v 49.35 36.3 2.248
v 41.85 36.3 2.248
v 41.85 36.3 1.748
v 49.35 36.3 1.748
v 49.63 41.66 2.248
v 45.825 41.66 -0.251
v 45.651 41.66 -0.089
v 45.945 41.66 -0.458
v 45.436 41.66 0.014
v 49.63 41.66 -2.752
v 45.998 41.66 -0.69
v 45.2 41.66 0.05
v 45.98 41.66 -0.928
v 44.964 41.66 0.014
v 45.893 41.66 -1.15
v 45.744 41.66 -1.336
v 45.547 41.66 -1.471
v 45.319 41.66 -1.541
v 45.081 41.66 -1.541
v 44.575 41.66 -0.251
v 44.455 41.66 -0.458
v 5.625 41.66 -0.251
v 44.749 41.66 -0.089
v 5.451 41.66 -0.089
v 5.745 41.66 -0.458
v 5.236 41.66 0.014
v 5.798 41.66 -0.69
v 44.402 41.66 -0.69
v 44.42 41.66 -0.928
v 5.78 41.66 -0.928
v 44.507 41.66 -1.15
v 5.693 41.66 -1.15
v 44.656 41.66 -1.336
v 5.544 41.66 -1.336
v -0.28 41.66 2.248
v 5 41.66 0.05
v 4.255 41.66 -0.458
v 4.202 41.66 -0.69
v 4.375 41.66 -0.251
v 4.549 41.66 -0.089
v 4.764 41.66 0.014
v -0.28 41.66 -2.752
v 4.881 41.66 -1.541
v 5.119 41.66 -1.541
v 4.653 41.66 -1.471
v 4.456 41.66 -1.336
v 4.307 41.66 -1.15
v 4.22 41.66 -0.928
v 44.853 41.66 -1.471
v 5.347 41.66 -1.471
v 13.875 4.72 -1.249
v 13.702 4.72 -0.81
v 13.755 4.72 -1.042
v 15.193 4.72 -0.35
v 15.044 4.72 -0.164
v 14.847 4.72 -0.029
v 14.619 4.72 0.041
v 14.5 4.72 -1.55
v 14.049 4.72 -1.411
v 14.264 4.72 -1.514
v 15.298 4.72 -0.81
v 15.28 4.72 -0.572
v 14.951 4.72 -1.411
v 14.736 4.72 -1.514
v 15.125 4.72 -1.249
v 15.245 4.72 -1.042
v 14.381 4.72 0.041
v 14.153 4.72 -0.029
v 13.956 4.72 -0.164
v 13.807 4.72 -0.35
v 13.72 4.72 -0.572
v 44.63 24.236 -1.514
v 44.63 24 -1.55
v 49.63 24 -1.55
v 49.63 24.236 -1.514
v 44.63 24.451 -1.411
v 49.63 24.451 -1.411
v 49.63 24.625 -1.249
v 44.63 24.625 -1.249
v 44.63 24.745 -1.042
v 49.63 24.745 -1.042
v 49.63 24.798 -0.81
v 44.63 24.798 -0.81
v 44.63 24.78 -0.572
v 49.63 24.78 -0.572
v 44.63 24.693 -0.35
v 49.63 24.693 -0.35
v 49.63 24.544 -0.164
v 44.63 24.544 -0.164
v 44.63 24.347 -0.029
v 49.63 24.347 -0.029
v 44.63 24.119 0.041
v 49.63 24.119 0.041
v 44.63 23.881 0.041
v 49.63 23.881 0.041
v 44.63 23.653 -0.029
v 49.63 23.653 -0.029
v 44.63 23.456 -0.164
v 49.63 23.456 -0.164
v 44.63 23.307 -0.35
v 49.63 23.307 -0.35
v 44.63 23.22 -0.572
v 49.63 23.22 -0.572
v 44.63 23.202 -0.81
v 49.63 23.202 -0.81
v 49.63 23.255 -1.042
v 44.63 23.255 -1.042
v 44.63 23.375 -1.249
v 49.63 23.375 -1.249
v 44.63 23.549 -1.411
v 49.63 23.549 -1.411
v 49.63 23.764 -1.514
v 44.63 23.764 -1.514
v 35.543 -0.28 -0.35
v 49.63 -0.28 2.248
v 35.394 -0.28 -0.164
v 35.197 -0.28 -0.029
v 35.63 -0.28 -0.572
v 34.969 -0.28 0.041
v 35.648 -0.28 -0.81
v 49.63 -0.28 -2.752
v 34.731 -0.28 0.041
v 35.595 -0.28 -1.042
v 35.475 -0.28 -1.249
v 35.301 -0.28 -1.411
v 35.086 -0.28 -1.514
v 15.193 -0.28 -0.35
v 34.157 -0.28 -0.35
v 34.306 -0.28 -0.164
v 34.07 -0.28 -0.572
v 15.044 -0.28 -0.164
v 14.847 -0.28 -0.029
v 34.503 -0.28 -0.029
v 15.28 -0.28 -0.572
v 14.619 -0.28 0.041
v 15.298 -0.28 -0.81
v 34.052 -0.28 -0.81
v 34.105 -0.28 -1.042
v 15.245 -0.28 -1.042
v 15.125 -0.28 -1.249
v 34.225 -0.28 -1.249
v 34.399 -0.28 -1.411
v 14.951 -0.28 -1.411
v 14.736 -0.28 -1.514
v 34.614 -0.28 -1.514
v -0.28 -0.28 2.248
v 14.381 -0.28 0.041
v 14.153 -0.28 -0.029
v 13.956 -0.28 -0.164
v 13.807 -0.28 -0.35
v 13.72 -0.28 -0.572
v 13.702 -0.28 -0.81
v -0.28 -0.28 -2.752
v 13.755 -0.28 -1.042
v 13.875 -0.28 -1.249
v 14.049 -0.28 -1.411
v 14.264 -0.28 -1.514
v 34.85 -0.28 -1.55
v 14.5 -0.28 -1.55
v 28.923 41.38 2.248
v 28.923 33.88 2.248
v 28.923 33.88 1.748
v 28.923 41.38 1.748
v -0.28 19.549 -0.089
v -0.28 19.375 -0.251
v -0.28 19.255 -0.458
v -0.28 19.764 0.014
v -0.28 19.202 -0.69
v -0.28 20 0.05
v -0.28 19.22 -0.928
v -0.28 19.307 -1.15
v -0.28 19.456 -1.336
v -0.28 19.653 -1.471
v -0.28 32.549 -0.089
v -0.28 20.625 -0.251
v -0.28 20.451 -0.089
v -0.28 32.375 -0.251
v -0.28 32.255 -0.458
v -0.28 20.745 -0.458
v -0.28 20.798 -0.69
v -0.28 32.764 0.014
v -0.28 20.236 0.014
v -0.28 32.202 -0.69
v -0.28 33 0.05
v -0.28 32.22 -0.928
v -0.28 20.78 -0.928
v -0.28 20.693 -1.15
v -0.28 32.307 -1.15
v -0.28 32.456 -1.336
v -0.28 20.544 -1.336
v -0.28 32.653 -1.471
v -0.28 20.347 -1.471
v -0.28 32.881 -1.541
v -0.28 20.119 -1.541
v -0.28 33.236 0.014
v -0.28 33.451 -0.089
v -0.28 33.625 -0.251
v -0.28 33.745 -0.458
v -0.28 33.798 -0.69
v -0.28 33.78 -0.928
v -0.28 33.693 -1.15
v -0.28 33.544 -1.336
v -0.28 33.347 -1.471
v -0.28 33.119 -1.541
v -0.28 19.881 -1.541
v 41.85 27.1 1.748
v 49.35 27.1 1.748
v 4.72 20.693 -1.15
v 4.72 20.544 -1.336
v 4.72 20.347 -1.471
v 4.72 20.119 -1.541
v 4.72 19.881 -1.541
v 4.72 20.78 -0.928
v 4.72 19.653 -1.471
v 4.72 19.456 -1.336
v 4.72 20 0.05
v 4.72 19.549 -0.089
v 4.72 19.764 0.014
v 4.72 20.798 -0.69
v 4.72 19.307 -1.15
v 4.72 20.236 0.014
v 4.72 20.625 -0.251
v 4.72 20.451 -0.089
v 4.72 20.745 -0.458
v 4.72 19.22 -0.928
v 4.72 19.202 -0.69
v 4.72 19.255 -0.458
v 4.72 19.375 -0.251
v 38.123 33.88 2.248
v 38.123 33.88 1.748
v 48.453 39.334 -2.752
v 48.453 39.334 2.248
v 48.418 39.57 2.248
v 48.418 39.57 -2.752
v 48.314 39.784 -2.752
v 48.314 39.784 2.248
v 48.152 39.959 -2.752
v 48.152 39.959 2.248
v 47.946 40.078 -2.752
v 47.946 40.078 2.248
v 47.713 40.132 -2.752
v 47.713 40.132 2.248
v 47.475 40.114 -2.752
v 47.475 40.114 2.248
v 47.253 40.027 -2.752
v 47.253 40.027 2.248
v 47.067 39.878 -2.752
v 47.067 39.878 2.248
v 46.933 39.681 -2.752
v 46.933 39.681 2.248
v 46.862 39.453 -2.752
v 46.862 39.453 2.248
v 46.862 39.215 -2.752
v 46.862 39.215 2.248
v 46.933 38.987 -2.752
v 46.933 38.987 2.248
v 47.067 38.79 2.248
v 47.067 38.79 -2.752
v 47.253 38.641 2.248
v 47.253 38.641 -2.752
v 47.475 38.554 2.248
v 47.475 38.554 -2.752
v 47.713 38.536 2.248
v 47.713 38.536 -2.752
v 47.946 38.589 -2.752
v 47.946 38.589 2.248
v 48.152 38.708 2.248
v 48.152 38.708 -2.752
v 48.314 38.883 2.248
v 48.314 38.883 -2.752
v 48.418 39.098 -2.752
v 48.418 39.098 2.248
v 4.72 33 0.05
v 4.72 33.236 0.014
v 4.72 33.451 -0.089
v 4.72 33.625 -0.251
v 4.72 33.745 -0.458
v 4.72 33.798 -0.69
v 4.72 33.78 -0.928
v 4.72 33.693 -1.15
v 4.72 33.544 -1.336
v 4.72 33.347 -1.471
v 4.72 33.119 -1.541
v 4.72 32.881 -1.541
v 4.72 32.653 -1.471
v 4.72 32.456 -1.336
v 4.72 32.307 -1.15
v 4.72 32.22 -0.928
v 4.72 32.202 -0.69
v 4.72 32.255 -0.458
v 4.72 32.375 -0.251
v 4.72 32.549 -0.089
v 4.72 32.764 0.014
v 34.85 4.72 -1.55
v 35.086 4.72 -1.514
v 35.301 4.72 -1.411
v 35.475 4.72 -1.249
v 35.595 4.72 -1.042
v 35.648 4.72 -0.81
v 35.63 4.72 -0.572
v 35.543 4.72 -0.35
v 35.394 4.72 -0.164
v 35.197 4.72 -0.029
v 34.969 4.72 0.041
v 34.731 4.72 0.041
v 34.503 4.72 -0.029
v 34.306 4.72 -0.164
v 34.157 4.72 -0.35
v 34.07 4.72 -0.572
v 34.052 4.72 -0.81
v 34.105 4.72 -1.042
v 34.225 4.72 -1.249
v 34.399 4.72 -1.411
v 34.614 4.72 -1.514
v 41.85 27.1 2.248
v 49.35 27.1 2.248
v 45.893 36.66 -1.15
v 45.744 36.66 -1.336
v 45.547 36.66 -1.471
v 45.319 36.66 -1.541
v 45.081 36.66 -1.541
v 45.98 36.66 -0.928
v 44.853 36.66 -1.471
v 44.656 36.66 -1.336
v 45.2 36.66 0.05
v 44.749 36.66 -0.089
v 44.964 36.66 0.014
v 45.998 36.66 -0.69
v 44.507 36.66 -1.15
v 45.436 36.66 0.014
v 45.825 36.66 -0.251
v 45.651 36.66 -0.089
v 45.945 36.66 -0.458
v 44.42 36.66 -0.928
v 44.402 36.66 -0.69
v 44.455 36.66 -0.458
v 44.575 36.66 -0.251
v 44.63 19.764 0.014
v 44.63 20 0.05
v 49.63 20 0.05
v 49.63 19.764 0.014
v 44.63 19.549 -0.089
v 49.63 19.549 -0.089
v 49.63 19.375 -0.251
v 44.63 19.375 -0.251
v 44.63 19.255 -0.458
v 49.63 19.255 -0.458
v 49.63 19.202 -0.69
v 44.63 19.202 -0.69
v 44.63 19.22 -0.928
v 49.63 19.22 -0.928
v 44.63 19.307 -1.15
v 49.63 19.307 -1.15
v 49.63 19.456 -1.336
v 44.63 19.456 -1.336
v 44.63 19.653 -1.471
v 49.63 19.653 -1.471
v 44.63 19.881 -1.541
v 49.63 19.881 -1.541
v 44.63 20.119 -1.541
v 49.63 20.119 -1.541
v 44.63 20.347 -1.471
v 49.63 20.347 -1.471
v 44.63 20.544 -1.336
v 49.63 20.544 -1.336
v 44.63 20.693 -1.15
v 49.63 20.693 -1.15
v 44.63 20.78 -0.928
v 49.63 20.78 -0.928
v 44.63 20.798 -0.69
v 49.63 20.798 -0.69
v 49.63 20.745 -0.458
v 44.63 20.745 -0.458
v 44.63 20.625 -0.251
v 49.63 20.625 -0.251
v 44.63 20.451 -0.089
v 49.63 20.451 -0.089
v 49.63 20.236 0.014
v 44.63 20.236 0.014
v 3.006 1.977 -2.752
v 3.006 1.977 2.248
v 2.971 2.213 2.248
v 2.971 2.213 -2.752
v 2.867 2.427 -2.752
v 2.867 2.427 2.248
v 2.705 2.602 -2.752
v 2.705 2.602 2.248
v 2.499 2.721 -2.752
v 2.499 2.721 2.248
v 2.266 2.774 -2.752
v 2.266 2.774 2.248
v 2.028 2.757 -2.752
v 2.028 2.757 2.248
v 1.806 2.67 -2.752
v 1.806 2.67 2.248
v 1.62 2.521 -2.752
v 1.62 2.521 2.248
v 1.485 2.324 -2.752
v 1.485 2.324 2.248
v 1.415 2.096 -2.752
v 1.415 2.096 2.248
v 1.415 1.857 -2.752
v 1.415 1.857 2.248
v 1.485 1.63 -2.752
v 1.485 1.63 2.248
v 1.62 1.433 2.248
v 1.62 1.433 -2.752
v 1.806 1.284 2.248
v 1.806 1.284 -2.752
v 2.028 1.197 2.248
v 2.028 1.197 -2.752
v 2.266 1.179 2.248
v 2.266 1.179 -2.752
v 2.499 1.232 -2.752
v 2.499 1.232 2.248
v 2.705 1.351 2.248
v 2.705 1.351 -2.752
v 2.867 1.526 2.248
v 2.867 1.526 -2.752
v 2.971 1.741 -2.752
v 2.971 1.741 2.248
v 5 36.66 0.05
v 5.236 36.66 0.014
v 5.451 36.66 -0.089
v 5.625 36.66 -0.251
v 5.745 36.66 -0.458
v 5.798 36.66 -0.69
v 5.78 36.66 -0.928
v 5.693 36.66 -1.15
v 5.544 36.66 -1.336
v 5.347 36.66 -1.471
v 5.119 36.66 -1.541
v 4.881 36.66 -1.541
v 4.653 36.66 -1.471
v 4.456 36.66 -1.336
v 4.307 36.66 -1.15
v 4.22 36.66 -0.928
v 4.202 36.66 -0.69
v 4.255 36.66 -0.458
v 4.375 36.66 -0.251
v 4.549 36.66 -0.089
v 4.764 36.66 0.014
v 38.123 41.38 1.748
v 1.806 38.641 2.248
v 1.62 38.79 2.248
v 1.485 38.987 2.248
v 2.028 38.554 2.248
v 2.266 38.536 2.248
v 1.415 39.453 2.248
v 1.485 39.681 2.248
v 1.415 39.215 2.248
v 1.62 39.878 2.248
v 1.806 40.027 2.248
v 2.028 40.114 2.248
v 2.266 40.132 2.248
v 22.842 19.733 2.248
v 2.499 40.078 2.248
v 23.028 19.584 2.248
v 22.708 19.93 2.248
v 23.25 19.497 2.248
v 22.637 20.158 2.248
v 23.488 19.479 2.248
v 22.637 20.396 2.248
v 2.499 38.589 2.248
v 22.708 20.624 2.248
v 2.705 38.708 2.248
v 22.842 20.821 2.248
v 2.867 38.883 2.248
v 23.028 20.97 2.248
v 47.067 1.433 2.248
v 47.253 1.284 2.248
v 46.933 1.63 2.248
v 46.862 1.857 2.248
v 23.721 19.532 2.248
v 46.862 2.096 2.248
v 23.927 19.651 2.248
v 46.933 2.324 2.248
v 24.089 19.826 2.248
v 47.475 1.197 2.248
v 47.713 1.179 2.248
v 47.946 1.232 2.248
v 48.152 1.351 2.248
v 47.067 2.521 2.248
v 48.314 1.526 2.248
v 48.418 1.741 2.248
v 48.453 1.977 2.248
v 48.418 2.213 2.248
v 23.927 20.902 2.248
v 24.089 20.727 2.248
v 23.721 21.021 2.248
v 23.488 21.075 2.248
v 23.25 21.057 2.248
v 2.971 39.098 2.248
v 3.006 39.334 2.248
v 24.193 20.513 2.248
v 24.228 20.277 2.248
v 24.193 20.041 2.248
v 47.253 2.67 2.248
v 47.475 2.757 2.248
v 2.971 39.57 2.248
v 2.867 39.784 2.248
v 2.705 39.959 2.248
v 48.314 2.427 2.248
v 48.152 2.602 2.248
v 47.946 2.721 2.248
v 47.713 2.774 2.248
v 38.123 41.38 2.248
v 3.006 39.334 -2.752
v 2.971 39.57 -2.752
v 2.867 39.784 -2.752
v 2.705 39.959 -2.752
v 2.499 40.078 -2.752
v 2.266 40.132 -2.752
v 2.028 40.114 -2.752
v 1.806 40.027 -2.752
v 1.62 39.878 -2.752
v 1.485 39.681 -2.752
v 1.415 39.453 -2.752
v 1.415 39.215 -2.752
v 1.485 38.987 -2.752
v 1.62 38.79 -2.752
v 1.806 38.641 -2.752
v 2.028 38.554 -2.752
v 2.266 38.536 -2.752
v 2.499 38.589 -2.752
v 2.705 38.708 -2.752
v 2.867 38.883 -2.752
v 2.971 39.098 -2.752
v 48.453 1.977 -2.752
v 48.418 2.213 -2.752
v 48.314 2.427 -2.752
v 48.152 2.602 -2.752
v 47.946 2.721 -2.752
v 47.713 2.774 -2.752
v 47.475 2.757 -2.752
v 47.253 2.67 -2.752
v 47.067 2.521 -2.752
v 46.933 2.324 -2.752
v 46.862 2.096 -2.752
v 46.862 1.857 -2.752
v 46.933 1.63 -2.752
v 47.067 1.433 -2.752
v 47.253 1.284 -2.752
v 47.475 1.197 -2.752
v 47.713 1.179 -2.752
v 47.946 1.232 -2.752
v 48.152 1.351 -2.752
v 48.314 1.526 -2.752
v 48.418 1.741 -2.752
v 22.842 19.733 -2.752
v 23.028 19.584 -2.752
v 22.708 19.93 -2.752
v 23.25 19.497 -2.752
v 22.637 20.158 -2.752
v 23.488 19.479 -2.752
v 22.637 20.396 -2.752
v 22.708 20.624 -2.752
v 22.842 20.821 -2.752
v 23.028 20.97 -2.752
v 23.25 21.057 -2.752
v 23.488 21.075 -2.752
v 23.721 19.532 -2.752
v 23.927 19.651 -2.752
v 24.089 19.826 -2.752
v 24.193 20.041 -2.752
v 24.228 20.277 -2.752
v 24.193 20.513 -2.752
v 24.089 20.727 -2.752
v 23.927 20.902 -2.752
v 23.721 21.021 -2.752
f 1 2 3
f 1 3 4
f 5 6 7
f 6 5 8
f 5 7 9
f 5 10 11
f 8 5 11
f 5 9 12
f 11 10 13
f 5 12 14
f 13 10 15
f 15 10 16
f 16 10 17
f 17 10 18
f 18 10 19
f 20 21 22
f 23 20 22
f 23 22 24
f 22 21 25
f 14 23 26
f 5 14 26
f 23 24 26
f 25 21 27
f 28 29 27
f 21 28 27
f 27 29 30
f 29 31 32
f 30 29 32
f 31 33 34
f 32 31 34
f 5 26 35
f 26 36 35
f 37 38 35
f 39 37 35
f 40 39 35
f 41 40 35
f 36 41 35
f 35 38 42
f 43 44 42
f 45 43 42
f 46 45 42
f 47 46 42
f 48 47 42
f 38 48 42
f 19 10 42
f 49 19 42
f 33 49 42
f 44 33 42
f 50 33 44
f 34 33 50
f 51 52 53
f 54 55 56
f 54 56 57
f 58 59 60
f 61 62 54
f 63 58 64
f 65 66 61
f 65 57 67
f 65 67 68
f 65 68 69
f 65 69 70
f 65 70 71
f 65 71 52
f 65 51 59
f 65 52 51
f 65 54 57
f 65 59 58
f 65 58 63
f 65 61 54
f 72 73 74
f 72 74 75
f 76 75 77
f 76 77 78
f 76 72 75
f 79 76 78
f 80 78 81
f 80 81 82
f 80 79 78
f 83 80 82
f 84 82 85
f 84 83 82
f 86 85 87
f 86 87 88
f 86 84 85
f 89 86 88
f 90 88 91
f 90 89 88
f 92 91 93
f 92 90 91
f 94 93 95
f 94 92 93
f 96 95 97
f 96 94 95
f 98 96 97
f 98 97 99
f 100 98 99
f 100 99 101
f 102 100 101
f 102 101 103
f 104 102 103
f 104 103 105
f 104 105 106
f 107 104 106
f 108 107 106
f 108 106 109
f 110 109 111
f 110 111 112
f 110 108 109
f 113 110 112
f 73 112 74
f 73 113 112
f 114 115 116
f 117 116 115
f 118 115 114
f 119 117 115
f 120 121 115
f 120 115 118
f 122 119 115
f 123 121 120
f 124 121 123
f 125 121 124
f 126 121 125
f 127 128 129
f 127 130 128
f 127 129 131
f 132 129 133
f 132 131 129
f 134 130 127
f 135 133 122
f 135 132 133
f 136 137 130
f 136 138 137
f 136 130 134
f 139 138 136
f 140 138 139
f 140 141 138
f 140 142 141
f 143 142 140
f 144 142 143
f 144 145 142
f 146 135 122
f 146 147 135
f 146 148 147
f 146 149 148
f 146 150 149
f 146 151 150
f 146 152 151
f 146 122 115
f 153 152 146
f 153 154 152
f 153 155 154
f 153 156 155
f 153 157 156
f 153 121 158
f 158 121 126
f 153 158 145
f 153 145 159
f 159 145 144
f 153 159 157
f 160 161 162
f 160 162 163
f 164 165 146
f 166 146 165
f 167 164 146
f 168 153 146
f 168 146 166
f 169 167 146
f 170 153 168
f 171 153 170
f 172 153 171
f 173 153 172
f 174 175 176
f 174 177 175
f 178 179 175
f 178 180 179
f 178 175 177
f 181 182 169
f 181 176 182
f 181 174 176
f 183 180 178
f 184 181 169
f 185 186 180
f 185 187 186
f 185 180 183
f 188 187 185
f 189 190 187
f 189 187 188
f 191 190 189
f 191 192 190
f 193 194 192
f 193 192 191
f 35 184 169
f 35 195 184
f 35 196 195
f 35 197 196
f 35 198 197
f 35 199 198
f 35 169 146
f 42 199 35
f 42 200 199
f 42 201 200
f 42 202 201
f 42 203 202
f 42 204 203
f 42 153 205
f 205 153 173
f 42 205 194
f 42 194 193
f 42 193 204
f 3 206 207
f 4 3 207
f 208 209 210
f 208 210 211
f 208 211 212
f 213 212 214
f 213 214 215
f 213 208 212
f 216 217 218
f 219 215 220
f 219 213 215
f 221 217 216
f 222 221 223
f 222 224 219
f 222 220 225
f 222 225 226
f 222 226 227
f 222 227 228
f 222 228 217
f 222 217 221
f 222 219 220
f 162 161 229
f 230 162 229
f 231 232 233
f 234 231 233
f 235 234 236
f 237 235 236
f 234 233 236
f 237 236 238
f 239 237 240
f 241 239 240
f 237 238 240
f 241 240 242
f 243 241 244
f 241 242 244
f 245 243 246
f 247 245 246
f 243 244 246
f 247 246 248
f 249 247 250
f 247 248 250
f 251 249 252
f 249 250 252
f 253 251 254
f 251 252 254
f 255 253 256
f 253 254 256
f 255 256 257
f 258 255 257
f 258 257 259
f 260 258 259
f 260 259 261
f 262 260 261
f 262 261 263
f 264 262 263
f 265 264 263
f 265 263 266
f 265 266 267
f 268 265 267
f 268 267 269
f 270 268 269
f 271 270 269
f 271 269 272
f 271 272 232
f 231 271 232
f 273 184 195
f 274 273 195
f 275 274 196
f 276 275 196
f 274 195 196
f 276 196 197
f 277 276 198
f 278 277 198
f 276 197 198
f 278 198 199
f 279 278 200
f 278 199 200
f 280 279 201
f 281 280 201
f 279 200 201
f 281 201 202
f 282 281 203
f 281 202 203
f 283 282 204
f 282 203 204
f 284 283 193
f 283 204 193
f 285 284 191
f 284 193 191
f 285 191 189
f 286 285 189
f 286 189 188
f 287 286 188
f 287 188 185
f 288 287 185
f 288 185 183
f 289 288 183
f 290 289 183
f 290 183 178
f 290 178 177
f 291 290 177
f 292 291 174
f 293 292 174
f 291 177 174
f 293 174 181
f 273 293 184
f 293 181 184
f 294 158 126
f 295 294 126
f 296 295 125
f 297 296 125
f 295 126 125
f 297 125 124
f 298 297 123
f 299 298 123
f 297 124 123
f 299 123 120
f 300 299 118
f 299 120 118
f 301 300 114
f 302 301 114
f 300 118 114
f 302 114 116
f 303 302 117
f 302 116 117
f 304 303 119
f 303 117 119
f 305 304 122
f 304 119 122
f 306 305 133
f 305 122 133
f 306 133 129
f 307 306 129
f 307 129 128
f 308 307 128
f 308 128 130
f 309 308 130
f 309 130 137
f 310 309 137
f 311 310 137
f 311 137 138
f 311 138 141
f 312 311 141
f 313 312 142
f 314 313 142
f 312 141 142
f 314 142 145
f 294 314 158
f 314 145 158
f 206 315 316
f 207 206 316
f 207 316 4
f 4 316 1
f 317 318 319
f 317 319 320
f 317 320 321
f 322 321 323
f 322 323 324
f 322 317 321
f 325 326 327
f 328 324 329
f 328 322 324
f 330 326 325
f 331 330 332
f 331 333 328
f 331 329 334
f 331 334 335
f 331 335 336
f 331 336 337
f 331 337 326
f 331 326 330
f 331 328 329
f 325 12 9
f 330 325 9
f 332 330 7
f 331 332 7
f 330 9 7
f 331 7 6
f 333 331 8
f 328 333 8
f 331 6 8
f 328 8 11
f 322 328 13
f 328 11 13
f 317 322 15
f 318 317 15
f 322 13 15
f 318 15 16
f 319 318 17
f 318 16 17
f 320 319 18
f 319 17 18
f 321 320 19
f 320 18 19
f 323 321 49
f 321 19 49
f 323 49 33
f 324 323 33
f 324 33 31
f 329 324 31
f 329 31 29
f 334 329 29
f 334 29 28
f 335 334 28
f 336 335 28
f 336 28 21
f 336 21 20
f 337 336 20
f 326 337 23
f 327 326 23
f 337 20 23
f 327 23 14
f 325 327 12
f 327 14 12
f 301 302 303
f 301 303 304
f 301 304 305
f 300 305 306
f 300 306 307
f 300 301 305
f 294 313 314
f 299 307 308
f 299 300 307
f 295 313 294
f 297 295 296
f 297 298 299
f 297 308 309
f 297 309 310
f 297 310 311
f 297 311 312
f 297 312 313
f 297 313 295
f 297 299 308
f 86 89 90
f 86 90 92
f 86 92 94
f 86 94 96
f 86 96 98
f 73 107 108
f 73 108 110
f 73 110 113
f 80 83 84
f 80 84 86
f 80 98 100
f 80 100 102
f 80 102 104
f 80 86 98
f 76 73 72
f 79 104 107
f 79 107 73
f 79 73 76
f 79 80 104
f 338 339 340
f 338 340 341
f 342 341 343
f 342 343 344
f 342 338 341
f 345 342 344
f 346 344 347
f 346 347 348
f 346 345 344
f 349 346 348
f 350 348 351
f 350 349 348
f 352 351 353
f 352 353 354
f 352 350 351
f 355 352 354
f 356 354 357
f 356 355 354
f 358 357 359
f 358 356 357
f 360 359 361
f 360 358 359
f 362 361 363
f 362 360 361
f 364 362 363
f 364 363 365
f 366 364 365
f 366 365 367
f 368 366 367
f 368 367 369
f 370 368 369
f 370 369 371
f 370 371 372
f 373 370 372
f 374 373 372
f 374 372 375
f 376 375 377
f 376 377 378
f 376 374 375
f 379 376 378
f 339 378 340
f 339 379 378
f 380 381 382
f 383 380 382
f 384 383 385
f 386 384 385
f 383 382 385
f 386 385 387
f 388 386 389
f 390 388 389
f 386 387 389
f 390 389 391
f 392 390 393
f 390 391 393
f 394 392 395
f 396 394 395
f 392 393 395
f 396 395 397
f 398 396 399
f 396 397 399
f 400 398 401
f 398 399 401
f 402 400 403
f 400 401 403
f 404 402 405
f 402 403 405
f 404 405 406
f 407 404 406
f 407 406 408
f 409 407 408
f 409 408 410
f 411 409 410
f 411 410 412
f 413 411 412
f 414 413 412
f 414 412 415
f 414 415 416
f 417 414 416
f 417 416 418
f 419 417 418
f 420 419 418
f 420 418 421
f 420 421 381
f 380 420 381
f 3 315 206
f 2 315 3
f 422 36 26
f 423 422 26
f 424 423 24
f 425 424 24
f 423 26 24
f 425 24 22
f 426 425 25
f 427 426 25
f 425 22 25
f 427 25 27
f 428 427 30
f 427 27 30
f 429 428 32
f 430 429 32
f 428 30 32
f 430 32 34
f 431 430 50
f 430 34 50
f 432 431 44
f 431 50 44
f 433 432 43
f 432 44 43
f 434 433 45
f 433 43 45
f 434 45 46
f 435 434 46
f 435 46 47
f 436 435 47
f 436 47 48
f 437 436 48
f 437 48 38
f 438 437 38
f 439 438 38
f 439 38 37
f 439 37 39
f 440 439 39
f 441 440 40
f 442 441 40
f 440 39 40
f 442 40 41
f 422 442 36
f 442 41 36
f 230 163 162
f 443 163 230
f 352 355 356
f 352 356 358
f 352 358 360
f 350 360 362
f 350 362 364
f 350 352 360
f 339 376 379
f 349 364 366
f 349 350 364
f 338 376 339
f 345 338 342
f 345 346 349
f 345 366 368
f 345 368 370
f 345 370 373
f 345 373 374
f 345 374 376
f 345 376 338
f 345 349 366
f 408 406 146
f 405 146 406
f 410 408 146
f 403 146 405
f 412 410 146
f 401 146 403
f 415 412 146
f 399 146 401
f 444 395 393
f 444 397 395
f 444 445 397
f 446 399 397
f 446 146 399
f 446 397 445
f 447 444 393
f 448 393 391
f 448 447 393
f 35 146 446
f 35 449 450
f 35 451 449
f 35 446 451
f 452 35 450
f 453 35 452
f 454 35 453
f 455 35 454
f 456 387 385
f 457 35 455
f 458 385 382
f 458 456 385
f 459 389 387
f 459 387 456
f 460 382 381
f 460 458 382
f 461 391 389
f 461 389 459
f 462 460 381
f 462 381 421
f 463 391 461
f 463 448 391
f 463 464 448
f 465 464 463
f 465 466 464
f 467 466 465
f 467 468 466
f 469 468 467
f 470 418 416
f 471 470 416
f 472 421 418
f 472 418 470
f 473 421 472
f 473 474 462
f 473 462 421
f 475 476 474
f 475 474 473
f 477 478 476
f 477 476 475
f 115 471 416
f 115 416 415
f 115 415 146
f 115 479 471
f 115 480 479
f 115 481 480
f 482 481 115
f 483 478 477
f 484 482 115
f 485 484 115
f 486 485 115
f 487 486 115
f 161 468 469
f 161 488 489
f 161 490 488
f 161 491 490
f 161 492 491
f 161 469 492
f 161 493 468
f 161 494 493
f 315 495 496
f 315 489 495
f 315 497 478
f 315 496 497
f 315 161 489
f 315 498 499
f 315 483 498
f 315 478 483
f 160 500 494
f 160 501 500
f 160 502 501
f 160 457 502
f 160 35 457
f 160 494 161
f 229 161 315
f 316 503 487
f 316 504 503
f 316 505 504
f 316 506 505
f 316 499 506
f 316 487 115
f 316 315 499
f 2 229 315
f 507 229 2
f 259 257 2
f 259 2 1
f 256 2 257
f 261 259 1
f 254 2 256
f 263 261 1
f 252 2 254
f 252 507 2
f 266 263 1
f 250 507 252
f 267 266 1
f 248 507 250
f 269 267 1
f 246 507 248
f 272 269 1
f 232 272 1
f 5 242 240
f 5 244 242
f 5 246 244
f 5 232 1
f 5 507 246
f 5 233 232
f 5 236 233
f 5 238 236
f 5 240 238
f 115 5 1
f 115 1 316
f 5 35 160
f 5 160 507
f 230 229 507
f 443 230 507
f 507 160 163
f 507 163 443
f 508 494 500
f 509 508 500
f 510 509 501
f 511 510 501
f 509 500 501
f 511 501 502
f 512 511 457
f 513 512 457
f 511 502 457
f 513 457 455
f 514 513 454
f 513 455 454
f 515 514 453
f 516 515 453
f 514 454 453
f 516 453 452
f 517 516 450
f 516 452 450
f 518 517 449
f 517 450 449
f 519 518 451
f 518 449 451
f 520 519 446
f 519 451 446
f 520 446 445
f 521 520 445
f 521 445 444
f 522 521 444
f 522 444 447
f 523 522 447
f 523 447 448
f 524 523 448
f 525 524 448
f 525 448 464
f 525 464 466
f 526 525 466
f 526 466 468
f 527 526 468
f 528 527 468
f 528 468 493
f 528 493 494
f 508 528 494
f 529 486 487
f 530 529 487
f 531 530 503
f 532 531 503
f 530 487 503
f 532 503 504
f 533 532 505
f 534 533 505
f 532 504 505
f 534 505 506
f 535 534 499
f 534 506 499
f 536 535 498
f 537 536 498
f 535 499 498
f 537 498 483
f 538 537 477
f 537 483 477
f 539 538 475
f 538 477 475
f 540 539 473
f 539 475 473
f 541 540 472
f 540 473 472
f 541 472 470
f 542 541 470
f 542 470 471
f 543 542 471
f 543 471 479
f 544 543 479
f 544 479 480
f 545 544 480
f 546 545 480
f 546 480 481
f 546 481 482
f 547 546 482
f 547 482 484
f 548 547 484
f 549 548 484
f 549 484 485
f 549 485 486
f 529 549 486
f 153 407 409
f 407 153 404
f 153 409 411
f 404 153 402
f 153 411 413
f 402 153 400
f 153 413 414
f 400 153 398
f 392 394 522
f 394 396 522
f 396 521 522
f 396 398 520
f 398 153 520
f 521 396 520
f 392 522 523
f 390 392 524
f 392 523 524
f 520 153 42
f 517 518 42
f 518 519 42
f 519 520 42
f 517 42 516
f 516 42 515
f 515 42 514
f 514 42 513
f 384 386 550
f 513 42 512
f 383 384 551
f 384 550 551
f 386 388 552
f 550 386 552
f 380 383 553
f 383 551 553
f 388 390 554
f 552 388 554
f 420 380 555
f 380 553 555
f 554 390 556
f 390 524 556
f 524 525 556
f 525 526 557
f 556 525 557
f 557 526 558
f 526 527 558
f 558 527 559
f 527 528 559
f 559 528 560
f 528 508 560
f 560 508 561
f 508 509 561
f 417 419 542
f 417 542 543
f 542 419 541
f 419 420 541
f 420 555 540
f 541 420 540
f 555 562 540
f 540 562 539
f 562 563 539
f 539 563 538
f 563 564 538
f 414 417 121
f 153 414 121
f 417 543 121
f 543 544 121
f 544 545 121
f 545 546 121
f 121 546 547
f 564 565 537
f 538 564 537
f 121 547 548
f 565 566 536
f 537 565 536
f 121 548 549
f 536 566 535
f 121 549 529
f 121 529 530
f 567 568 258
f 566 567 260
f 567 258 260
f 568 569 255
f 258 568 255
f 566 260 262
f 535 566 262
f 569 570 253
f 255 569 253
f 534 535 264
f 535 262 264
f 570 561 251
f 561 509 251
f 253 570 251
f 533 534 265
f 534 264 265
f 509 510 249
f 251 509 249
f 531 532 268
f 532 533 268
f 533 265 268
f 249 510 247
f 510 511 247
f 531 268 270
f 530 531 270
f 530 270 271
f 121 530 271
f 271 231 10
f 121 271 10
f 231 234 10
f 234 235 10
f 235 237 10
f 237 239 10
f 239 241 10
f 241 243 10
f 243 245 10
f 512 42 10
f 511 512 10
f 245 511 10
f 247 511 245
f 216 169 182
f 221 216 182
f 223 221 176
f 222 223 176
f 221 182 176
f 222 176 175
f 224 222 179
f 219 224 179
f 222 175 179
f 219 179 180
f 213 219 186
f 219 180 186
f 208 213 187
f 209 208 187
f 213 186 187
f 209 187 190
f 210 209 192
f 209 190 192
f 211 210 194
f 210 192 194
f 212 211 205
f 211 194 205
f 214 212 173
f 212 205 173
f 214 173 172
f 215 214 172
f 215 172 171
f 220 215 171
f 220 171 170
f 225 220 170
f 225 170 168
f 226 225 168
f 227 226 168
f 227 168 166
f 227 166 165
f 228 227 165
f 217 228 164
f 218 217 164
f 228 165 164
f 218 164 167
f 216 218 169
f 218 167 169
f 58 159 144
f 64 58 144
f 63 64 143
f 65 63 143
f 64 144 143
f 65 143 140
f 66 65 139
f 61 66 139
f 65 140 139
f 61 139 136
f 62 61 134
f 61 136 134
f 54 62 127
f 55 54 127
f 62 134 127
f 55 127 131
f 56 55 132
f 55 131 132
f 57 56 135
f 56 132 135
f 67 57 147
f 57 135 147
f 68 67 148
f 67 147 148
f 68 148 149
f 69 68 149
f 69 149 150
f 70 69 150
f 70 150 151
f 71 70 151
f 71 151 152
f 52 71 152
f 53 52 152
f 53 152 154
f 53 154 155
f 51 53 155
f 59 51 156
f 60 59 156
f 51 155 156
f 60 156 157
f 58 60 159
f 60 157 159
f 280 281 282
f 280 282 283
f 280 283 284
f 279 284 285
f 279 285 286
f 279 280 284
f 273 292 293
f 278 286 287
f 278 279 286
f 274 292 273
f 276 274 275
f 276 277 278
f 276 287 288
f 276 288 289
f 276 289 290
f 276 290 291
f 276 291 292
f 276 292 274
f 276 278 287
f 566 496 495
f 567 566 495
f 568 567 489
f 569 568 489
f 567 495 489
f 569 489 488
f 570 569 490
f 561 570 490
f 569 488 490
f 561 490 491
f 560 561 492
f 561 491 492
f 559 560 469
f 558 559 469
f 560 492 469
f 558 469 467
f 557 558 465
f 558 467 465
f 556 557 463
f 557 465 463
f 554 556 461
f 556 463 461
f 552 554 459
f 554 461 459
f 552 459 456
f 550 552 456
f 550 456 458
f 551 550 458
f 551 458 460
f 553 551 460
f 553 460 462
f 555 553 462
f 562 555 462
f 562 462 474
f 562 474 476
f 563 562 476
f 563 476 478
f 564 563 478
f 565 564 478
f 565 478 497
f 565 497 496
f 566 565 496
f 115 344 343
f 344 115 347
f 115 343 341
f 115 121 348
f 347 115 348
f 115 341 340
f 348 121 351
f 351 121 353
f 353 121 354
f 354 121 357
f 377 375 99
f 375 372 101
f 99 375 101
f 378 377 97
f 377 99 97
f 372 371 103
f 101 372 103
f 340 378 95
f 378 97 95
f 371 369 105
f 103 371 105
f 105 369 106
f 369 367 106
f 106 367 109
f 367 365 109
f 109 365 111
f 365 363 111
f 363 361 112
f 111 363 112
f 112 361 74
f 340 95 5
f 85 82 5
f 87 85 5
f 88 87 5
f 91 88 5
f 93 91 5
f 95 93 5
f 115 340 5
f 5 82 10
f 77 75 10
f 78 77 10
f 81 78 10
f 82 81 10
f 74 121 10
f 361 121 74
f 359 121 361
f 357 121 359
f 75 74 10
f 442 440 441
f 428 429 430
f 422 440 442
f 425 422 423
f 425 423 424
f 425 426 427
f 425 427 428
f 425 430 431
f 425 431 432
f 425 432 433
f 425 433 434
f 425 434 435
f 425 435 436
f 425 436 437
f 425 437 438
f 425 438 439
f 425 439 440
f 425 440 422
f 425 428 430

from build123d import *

# Parameters (mm, degrees)
MAIN_STOCK_START                   = -2.751909566
SKETCH_1_W                         = 57.95
SKETCH_1_H                         = 49.98
MAIN_STOCK_DEPTH                   = 5
SKETCH_3_R                         = 0.8
PCB_5XD1P6_M2_THROUGH_DEPTH        = 71.63982517
SKETCH_10_W                        = 7.5
SKETCH_10_H                        = 9.2
TYPEC_BOTTOM_RECESS_A_DEPTH        = 0.5
SKETCH_11_W                        = 9.2
SKETCH_11_H                        = 7.5
TYPEC_BOTTOM_RECESS_B_DEPTH        = 0.5
SKETCH_12_W                        = 62
SKETCH_12_H                        = 54
SKETCH_12_W_2                      = 49.91
SKETCH_12_H_2                      = 41.94
INSET_BASE_PERIMETER_DEPTH         = 5.1
SKETCH_13_R                        = 0.8
HORIZONTAL_BASE_M2_0_0_00028_DEPTH = 5
HORIZONTAL_BASE_M2_0_0_04963_START = -5
SKETCH_14_R                        = 0.8
HORIZONTAL_BASE_M2_0_0_04963_DEPTH = 5
SKETCH_15_R                        = 0.8
HORIZONTAL_BASE_M2_1_0_00028_DEPTH = 5
SKETCH_16_R                        = 0.8
HORIZONTAL_BASE_M2_1_0_04166_DEPTH = 5


with BuildPart() as part:
    # 草图1 → Main_Stock (new body)
    with BuildSketch(Plane.XY.offset(MAIN_STOCK_START)):
        with Locations((24.675, 20.69)):
            Rectangle(SKETCH_1_W, SKETCH_1_H)
    extrude(amount=MAIN_STOCK_DEPTH)

    # 草图3 → PCB_5xD1p6_M2_Through (cut, through all)
    with BuildSketch(Plane.XY.offset(2.248090434)):
        with Locations((23.428293927, 20.276755792)):
            Circle(SKETCH_3_R)
        with Locations((2.206251763, 39.333791606)):
            Circle(SKETCH_3_R)
        with Locations((47.653340917, 39.333791606)):
            Circle(SKETCH_3_R)
        with Locations((47.653340917, 1.976720232)):
            Circle(SKETCH_3_R)
        with Locations((2.206251763, 1.976720232)):
            Circle(SKETCH_3_R)
    extrude(amount=-PCB_5XD1P6_M2_THROUGH_DEPTH, mode=Mode.SUBTRACT)

    # 草图10 → TypeC_Bottom_Recess_A (cut)
    with BuildSketch(Plane.XY.offset(2.248090434)):
        with Locations((45.6, 31.7)):
            Rectangle(SKETCH_10_W, SKETCH_10_H)
    extrude(amount=-TYPEC_BOTTOM_RECESS_A_DEPTH, mode=Mode.SUBTRACT)

    # 草图11 → TypeC_Bottom_Recess_B (cut)
    with BuildSketch(Plane.XY.offset(2.248090434)):
        with Locations((33.523, 37.63)):
            Rectangle(SKETCH_11_W, SKETCH_11_H)
    extrude(amount=-TYPEC_BOTTOM_RECESS_B_DEPTH, mode=Mode.SUBTRACT)

    # 草图12 → Inset_Base_Perimeter (cut)
    with BuildSketch(Plane(origin=(0, 0, -2.751909566), x_dir=(-1, 0, 0), z_dir=(0, 0, -1))):
        with Locations((-25, 21)):
            Rectangle(SKETCH_12_W, SKETCH_12_H)
        with Locations((-24.675, 20.69)):
            Rectangle(SKETCH_12_W_2, SKETCH_12_H_2, mode=Mode.SUBTRACT)
    extrude(amount=-INSET_BASE_PERIMETER_DEPTH, mode=Mode.SUBTRACT)

    # 草图13 → Horizontal_Base_M2_0_-0.00028 (cut)
    with BuildSketch(Plane.ZY.offset(0.28)):
        with Locations((-0.75, 20)):
            Circle(SKETCH_13_R)
        with Locations((-0.75, 33)):
            Circle(SKETCH_13_R)
    extrude(amount=-HORIZONTAL_BASE_M2_0_0_00028_DEPTH, mode=Mode.SUBTRACT)

    # 草图14 → Horizontal_Base_M2_0_0.04963 (cut)
    with BuildSketch(Plane(origin=(49.63, 0, 0), x_dir=(0, 0, -1), z_dir=(1, 0, 0)).offset(HORIZONTAL_BASE_M2_0_0_04963_START)):
        with Locations(Location((0.75, 20, 0), (0, 0, 180))):
            Circle(SKETCH_14_R)
        with Locations((0.75, 24)):
            Circle(SKETCH_14_R)
    extrude(amount=HORIZONTAL_BASE_M2_0_0_04963_DEPTH, mode=Mode.SUBTRACT)

    # 草图15 → Horizontal_Base_M2_1_-0.00028 (cut)
    with BuildSketch(Plane.XZ.offset(0.28)):
        with Locations(Location((14.5, -0.75, 0), (0, 0, 270))):
            Circle(SKETCH_15_R)
        with Locations(Location((34.85, -0.75, 0), (0, 0, 270))):
            Circle(SKETCH_15_R)
    extrude(amount=-HORIZONTAL_BASE_M2_1_0_00028_DEPTH, mode=Mode.SUBTRACT)

    # 草图16 → Horizontal_Base_M2_1_0.04166 (cut)
    with BuildSketch(Plane(origin=(0, 41.66, 0), x_dir=(1, 0, 0), z_dir=(0, 1, 0))):
        with Locations(Location((5, 0.75, 0), (0, 0, 270))):
            Circle(SKETCH_16_R)
        with Locations(Location((45.2, 0.75, 0), (0, 0, 270))):
            Circle(SKETCH_16_R)
    extrude(amount=-HORIZONTAL_BASE_M2_1_0_04166_DEPTH, mode=Mode.SUBTRACT)


solid = part.part
